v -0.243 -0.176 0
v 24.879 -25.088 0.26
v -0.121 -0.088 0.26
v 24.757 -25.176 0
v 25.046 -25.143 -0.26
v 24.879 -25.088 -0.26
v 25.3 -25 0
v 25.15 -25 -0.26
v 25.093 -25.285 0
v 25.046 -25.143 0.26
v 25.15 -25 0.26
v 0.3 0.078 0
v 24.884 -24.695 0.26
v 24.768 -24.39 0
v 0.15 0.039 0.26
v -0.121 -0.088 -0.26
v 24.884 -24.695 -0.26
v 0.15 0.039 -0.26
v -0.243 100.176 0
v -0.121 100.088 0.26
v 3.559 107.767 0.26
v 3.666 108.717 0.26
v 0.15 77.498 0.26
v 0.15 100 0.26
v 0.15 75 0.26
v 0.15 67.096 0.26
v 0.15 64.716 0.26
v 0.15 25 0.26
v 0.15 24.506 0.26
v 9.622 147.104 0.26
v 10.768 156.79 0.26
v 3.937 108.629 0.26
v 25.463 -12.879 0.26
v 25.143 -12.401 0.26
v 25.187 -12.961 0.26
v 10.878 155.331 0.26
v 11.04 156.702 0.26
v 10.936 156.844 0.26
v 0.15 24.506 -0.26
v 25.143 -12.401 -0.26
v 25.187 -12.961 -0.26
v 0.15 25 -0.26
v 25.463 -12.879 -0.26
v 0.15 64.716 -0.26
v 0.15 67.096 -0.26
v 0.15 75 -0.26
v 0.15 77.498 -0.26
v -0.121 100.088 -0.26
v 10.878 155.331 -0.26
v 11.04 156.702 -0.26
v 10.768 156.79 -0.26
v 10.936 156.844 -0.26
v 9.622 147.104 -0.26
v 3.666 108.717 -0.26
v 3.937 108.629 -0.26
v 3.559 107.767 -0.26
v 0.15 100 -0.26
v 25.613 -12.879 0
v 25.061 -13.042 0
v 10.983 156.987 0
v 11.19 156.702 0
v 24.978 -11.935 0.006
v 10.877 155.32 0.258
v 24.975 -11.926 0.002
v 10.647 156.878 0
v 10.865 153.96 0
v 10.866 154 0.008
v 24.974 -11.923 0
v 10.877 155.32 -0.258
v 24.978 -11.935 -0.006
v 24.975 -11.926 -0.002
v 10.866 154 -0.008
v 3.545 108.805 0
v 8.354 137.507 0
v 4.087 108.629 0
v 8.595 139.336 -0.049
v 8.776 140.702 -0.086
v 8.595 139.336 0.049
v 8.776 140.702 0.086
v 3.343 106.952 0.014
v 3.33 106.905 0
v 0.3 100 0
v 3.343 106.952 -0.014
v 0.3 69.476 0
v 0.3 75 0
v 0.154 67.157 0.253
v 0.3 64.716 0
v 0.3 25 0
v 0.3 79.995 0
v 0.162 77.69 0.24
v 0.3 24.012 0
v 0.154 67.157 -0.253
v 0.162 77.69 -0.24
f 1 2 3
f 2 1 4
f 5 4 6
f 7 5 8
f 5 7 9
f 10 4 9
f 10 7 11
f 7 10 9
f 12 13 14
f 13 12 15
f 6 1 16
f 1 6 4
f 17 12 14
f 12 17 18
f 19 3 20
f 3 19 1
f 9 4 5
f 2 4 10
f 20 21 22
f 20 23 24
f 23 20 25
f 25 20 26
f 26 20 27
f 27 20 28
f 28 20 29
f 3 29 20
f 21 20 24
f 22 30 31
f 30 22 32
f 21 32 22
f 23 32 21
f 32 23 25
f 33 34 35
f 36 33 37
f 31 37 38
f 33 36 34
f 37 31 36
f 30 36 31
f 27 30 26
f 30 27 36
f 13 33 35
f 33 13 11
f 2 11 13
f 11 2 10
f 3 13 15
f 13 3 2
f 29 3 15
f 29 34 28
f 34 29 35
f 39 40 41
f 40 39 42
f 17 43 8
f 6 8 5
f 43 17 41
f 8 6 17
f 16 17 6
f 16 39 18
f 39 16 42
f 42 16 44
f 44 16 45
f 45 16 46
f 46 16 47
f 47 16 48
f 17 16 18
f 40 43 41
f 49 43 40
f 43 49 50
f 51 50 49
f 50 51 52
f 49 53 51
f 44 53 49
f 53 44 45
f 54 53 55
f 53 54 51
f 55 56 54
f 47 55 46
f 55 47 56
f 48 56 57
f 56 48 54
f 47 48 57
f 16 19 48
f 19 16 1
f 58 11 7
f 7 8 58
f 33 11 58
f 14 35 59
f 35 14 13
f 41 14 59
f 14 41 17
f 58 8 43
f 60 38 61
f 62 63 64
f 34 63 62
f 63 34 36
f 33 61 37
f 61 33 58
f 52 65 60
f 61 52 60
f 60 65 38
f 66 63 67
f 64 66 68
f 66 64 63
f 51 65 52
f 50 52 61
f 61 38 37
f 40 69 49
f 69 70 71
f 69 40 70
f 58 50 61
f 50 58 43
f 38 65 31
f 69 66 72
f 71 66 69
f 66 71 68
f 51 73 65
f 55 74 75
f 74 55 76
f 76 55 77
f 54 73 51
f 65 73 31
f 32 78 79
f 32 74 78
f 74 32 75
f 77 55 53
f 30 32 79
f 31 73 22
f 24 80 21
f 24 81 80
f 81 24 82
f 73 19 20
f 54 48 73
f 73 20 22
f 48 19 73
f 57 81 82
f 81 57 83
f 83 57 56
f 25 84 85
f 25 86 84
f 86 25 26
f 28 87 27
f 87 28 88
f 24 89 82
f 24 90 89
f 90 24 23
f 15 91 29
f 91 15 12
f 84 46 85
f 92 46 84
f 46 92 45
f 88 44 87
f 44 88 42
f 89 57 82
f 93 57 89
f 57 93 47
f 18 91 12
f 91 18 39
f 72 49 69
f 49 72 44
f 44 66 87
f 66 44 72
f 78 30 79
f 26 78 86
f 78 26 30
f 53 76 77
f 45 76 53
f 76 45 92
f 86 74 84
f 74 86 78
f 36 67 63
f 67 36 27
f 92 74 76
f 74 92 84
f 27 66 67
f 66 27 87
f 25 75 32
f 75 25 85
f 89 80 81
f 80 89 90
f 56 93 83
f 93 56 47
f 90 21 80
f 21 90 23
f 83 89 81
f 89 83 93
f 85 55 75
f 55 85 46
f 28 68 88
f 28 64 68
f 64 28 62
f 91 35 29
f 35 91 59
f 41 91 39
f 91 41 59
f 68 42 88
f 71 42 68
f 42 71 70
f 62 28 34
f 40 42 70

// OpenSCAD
B=[0,0];
T=[0,100];
W=[25,-25];

mbt=lerp(B,T,rnd(0.25,0.75));
mwt= un(lerp(W,T,rnd())-mbt)*rnd(25,100)+mbt ;


hmbt=lerp(B,T, (0.75));

hmwt= un(lerp(mwt,T,rnd())-hmbt)*rnd(25,75)+hmbt ;

lmbt=lerp(B,T,(0.25));
lmwt= un(lerp(W,mwt,rnd())-lmbt)*rnd(25,100)+lmbt ;


line(mwt,mbt);
line(hmwt,hmbt);
line(lmwt,lmbt);
line(B,T);
line(B,W);


polyline([B,W,lmwt,mwt,hmwt,T]);



 module polyline(p) {for(i=[0:max(0,len(p)-1)])line(p[i],p[wrap(i+1,len(p) )]);
} // polyline plotter

module line(p1, p2 ,width=0.3) 
{ // single line plotter
    hull() {
        translate(p1) sphere(width);
        translate(p2) sphere(width);
    }
}
function rnd(a = 1, b = 0, s = []) = 
  s == [] ? 
   (rands(min(a, b), max(   a, b), 1)[0]) 
  : 
   (rands(min(a, b), max(a, b), 1, s)[0])
  ; // nice rands wrapper 
function lerp(start, end, bias) = (end * bias + start * (1 - bias));
function un(v) = v / max(norm(v), 0.000001) * 1;
function wrap(x,x_max=1,x_min=0) = (((x - x_min) % (x_max - x_min)) + (x_max - x_min)) % (x_max - x_min) + x_min; // wraps numbers inside boundaries
